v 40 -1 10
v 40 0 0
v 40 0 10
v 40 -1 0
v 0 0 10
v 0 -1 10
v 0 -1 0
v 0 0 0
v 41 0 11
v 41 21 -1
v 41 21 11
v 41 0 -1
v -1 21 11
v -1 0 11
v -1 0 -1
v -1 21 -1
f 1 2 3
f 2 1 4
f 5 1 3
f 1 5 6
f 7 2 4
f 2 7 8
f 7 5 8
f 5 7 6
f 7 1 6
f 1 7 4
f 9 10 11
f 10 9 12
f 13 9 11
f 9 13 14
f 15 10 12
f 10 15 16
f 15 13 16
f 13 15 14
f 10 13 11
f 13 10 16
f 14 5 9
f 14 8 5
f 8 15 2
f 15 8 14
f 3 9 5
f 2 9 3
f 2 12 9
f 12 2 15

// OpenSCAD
// Unit of length: Unit.MM
union()
{
   color(c = [1.0, 0.0, 0.0, 1.0])
   {
      translate(v = [0.0, -1.0, 0.0])
      {
         cube(size = [40.0, 21.0, 10.0], center = false);
      }
   }
   translate(v = [-1.0, 0.0, -1.0])
   {
      cube(size = [42.0, 21.0, 12.0], center = false);
   }
}
